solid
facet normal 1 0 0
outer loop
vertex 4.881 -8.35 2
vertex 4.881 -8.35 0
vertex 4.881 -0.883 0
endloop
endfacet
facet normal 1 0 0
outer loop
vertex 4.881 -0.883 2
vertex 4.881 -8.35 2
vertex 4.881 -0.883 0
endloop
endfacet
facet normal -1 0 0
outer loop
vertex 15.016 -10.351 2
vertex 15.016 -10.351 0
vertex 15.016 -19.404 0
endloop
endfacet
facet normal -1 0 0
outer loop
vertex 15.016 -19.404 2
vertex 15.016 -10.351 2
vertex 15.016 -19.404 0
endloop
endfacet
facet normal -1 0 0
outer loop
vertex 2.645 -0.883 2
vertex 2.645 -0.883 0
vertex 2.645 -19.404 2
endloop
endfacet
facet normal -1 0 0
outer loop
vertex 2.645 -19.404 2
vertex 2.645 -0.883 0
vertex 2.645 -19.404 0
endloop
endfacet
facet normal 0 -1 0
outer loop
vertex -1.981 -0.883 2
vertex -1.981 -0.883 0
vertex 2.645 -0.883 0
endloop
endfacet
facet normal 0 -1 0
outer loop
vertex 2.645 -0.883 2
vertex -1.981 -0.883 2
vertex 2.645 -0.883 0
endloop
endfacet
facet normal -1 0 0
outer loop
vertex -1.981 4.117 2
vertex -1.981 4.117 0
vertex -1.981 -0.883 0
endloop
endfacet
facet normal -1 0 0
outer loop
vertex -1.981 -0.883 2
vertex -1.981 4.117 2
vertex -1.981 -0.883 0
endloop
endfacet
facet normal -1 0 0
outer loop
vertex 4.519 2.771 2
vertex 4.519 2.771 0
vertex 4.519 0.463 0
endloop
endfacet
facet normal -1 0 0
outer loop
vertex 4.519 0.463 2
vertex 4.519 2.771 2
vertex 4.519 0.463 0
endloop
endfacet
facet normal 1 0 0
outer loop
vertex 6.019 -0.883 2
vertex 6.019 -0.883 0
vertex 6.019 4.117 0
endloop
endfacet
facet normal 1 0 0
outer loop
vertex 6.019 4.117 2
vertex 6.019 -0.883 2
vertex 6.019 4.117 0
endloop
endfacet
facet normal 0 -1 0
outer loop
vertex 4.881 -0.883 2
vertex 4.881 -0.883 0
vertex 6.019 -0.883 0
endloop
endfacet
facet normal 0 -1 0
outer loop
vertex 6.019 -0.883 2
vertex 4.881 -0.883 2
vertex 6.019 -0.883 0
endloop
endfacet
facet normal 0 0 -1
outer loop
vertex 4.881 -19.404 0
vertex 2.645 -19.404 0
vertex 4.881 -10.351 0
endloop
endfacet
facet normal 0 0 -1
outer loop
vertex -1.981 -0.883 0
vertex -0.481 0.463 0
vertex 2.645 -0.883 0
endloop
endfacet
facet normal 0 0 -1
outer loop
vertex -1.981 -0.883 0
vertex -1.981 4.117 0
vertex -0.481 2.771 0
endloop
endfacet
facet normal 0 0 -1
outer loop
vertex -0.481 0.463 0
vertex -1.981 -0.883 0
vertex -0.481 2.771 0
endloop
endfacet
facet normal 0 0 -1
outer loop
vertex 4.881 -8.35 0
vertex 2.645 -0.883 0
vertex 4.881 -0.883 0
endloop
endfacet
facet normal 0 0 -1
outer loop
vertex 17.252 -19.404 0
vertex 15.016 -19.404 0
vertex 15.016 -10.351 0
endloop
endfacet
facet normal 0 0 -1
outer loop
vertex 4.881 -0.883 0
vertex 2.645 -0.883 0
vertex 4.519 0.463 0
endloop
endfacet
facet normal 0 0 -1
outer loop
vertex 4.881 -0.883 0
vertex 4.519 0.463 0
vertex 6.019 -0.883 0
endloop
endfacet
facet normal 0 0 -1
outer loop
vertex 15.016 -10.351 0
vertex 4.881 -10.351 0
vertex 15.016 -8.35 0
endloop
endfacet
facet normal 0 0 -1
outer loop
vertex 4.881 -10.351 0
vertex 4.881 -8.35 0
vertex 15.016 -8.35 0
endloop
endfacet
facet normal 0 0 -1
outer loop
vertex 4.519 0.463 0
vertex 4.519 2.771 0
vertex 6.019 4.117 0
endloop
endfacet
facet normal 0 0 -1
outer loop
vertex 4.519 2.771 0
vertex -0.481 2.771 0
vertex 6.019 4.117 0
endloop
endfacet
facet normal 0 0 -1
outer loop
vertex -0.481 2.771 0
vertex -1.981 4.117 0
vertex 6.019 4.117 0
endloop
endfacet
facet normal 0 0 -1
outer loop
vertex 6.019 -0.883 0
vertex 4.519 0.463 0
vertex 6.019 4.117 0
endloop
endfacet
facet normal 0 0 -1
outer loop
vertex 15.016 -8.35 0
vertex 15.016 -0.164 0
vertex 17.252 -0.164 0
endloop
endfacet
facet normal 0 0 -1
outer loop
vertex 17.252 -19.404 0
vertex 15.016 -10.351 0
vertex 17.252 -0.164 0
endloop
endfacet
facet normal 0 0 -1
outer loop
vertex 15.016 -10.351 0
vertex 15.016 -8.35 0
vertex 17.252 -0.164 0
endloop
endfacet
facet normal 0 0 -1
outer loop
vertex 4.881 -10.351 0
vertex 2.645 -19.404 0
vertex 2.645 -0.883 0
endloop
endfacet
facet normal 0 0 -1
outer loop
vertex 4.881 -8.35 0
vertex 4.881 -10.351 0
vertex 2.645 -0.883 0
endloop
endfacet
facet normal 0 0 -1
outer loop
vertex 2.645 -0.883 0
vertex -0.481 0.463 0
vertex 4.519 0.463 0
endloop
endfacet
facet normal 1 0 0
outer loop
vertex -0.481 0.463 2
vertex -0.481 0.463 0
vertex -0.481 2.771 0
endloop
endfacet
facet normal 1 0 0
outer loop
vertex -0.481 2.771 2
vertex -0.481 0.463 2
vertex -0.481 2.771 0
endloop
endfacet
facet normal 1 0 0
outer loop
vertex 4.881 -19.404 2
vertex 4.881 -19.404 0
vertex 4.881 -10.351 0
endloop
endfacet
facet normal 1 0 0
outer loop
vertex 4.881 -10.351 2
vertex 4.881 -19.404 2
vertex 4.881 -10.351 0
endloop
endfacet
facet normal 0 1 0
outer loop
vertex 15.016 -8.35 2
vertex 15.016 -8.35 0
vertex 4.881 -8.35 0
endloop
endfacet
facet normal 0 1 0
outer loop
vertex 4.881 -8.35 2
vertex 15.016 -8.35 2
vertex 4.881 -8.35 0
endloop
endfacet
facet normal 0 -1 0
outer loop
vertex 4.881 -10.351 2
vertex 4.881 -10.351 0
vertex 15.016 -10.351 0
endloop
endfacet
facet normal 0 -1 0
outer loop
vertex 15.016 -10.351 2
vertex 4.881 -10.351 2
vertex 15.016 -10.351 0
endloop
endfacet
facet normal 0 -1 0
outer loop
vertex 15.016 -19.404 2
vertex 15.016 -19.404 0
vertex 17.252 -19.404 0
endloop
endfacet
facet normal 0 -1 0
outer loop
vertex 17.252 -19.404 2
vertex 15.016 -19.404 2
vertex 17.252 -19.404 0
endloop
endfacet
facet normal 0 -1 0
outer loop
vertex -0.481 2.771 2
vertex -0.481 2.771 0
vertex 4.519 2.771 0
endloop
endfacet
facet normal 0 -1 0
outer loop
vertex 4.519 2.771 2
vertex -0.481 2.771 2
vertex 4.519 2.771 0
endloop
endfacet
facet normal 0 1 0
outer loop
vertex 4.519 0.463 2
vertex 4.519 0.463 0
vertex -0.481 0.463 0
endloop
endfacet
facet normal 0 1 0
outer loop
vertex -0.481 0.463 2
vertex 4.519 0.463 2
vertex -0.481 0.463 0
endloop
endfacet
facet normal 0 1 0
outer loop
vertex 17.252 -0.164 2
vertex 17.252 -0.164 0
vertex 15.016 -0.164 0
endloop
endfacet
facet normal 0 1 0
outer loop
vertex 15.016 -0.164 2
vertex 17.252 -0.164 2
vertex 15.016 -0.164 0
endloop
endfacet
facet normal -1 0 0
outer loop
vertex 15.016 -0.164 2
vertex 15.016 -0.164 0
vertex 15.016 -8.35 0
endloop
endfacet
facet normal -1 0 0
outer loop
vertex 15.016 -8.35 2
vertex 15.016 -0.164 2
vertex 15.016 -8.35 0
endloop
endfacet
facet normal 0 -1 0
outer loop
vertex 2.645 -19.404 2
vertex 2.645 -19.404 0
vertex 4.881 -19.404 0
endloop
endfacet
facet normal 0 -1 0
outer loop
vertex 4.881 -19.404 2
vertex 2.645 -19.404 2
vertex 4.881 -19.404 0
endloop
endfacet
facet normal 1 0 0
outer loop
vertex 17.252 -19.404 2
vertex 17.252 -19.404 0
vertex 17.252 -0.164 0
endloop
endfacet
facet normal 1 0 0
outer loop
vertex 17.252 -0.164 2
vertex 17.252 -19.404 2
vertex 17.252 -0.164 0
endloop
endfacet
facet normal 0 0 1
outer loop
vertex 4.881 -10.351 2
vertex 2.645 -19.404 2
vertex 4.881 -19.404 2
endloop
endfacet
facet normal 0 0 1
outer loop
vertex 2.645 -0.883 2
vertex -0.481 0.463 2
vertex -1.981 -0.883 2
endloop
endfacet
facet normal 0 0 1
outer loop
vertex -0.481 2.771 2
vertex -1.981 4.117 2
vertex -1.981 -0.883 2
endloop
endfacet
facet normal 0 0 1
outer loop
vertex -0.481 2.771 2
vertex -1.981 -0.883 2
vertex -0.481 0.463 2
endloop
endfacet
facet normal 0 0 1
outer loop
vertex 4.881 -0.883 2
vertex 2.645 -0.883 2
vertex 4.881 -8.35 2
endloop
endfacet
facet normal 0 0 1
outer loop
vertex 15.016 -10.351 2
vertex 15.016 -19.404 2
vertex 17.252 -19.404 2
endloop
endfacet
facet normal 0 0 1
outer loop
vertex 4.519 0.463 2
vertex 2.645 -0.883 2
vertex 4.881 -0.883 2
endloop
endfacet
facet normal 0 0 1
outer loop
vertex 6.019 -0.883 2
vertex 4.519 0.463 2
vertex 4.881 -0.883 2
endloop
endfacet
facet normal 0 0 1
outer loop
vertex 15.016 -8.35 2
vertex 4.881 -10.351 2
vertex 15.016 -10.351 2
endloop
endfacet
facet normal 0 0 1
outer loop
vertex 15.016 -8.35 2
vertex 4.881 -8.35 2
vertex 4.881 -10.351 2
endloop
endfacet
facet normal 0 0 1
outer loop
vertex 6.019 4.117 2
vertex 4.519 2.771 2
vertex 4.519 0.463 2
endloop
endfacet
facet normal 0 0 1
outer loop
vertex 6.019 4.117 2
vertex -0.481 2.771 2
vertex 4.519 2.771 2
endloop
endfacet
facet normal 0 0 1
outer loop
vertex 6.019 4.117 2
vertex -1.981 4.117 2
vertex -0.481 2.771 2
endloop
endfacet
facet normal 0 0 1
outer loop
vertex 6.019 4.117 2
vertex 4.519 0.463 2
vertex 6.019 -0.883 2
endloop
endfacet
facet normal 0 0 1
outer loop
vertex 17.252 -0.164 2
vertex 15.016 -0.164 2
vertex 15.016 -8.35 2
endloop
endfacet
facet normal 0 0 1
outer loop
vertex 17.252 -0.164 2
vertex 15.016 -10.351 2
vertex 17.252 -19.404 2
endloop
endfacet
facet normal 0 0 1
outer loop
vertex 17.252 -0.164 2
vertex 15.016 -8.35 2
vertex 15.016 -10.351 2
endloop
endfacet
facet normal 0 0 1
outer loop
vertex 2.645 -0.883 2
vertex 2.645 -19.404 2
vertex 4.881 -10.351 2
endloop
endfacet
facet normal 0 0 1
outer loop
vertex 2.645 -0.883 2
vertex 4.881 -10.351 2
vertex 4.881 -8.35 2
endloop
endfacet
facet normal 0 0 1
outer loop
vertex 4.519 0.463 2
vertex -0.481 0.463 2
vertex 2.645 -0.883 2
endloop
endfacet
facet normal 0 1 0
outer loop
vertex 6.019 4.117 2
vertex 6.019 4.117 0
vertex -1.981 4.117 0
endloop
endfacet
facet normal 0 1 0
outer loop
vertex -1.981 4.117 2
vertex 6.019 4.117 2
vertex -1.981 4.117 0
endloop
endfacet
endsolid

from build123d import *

# Parameters (mm, degrees)
F0_W     = 2.236037234
F0_H     = 0.718915021
F1_DEPTH = 2


with BuildPart() as f1:
    # F0 (on Top) → F1 (new body)
    with BuildSketch(Plane.XY):
        Polygon((2.0192633942, 0.4625715956), (2.0192633942, -0.8831437444), (2.6445035461, -0.8831437444), (2.6445035461, -0.1642287234), (4.8805407801, -0.1642287234), (4.8805407801, -0.8831437444), (6.0192633942, -0.8831437444), (6.0192633942, 4.1168562556), (2.0192633942, 4.1168562556), (2.0192633942, 2.7711409156), (4.5192633942, 2.7711409156), (4.5192633942, 0.4625715956), align=None)
        Polygon((-1.9807366058, -0.8831437444), (2.0192633942, -0.8831437444), (2.0192633942, 0.4625715956), (-0.4807366058, 0.4625715956), (-0.4807366058, 2.7711409156), (2.0192633942, 2.7711409156), (2.0192633942, 4.1168562556), (-1.9807366058, 4.1168562556), align=None)
        with Locations((3.7625221631, -0.5236862339)):
            Rectangle(F0_W, F0_H)
        Polygon((4.8805407801, -0.8831437444), (2.6445035461, -0.8831437444), (2.6445035461, -19.4042553191), (4.8805407801, -19.4042553191), (4.8805407801, -10.3506205674), (15.0164007092, -10.3506205674), (15.0164007092, -19.4042553191), (17.2524379433, -19.4042553191), (17.2524379433, -0.1642287234), (15.0164007092, -0.1642287234), (15.0164007092, -8.3503989362), (4.8805407801, -8.3503989362), align=None)
    extrude(amount=F1_DEPTH)


solid = f1.part
